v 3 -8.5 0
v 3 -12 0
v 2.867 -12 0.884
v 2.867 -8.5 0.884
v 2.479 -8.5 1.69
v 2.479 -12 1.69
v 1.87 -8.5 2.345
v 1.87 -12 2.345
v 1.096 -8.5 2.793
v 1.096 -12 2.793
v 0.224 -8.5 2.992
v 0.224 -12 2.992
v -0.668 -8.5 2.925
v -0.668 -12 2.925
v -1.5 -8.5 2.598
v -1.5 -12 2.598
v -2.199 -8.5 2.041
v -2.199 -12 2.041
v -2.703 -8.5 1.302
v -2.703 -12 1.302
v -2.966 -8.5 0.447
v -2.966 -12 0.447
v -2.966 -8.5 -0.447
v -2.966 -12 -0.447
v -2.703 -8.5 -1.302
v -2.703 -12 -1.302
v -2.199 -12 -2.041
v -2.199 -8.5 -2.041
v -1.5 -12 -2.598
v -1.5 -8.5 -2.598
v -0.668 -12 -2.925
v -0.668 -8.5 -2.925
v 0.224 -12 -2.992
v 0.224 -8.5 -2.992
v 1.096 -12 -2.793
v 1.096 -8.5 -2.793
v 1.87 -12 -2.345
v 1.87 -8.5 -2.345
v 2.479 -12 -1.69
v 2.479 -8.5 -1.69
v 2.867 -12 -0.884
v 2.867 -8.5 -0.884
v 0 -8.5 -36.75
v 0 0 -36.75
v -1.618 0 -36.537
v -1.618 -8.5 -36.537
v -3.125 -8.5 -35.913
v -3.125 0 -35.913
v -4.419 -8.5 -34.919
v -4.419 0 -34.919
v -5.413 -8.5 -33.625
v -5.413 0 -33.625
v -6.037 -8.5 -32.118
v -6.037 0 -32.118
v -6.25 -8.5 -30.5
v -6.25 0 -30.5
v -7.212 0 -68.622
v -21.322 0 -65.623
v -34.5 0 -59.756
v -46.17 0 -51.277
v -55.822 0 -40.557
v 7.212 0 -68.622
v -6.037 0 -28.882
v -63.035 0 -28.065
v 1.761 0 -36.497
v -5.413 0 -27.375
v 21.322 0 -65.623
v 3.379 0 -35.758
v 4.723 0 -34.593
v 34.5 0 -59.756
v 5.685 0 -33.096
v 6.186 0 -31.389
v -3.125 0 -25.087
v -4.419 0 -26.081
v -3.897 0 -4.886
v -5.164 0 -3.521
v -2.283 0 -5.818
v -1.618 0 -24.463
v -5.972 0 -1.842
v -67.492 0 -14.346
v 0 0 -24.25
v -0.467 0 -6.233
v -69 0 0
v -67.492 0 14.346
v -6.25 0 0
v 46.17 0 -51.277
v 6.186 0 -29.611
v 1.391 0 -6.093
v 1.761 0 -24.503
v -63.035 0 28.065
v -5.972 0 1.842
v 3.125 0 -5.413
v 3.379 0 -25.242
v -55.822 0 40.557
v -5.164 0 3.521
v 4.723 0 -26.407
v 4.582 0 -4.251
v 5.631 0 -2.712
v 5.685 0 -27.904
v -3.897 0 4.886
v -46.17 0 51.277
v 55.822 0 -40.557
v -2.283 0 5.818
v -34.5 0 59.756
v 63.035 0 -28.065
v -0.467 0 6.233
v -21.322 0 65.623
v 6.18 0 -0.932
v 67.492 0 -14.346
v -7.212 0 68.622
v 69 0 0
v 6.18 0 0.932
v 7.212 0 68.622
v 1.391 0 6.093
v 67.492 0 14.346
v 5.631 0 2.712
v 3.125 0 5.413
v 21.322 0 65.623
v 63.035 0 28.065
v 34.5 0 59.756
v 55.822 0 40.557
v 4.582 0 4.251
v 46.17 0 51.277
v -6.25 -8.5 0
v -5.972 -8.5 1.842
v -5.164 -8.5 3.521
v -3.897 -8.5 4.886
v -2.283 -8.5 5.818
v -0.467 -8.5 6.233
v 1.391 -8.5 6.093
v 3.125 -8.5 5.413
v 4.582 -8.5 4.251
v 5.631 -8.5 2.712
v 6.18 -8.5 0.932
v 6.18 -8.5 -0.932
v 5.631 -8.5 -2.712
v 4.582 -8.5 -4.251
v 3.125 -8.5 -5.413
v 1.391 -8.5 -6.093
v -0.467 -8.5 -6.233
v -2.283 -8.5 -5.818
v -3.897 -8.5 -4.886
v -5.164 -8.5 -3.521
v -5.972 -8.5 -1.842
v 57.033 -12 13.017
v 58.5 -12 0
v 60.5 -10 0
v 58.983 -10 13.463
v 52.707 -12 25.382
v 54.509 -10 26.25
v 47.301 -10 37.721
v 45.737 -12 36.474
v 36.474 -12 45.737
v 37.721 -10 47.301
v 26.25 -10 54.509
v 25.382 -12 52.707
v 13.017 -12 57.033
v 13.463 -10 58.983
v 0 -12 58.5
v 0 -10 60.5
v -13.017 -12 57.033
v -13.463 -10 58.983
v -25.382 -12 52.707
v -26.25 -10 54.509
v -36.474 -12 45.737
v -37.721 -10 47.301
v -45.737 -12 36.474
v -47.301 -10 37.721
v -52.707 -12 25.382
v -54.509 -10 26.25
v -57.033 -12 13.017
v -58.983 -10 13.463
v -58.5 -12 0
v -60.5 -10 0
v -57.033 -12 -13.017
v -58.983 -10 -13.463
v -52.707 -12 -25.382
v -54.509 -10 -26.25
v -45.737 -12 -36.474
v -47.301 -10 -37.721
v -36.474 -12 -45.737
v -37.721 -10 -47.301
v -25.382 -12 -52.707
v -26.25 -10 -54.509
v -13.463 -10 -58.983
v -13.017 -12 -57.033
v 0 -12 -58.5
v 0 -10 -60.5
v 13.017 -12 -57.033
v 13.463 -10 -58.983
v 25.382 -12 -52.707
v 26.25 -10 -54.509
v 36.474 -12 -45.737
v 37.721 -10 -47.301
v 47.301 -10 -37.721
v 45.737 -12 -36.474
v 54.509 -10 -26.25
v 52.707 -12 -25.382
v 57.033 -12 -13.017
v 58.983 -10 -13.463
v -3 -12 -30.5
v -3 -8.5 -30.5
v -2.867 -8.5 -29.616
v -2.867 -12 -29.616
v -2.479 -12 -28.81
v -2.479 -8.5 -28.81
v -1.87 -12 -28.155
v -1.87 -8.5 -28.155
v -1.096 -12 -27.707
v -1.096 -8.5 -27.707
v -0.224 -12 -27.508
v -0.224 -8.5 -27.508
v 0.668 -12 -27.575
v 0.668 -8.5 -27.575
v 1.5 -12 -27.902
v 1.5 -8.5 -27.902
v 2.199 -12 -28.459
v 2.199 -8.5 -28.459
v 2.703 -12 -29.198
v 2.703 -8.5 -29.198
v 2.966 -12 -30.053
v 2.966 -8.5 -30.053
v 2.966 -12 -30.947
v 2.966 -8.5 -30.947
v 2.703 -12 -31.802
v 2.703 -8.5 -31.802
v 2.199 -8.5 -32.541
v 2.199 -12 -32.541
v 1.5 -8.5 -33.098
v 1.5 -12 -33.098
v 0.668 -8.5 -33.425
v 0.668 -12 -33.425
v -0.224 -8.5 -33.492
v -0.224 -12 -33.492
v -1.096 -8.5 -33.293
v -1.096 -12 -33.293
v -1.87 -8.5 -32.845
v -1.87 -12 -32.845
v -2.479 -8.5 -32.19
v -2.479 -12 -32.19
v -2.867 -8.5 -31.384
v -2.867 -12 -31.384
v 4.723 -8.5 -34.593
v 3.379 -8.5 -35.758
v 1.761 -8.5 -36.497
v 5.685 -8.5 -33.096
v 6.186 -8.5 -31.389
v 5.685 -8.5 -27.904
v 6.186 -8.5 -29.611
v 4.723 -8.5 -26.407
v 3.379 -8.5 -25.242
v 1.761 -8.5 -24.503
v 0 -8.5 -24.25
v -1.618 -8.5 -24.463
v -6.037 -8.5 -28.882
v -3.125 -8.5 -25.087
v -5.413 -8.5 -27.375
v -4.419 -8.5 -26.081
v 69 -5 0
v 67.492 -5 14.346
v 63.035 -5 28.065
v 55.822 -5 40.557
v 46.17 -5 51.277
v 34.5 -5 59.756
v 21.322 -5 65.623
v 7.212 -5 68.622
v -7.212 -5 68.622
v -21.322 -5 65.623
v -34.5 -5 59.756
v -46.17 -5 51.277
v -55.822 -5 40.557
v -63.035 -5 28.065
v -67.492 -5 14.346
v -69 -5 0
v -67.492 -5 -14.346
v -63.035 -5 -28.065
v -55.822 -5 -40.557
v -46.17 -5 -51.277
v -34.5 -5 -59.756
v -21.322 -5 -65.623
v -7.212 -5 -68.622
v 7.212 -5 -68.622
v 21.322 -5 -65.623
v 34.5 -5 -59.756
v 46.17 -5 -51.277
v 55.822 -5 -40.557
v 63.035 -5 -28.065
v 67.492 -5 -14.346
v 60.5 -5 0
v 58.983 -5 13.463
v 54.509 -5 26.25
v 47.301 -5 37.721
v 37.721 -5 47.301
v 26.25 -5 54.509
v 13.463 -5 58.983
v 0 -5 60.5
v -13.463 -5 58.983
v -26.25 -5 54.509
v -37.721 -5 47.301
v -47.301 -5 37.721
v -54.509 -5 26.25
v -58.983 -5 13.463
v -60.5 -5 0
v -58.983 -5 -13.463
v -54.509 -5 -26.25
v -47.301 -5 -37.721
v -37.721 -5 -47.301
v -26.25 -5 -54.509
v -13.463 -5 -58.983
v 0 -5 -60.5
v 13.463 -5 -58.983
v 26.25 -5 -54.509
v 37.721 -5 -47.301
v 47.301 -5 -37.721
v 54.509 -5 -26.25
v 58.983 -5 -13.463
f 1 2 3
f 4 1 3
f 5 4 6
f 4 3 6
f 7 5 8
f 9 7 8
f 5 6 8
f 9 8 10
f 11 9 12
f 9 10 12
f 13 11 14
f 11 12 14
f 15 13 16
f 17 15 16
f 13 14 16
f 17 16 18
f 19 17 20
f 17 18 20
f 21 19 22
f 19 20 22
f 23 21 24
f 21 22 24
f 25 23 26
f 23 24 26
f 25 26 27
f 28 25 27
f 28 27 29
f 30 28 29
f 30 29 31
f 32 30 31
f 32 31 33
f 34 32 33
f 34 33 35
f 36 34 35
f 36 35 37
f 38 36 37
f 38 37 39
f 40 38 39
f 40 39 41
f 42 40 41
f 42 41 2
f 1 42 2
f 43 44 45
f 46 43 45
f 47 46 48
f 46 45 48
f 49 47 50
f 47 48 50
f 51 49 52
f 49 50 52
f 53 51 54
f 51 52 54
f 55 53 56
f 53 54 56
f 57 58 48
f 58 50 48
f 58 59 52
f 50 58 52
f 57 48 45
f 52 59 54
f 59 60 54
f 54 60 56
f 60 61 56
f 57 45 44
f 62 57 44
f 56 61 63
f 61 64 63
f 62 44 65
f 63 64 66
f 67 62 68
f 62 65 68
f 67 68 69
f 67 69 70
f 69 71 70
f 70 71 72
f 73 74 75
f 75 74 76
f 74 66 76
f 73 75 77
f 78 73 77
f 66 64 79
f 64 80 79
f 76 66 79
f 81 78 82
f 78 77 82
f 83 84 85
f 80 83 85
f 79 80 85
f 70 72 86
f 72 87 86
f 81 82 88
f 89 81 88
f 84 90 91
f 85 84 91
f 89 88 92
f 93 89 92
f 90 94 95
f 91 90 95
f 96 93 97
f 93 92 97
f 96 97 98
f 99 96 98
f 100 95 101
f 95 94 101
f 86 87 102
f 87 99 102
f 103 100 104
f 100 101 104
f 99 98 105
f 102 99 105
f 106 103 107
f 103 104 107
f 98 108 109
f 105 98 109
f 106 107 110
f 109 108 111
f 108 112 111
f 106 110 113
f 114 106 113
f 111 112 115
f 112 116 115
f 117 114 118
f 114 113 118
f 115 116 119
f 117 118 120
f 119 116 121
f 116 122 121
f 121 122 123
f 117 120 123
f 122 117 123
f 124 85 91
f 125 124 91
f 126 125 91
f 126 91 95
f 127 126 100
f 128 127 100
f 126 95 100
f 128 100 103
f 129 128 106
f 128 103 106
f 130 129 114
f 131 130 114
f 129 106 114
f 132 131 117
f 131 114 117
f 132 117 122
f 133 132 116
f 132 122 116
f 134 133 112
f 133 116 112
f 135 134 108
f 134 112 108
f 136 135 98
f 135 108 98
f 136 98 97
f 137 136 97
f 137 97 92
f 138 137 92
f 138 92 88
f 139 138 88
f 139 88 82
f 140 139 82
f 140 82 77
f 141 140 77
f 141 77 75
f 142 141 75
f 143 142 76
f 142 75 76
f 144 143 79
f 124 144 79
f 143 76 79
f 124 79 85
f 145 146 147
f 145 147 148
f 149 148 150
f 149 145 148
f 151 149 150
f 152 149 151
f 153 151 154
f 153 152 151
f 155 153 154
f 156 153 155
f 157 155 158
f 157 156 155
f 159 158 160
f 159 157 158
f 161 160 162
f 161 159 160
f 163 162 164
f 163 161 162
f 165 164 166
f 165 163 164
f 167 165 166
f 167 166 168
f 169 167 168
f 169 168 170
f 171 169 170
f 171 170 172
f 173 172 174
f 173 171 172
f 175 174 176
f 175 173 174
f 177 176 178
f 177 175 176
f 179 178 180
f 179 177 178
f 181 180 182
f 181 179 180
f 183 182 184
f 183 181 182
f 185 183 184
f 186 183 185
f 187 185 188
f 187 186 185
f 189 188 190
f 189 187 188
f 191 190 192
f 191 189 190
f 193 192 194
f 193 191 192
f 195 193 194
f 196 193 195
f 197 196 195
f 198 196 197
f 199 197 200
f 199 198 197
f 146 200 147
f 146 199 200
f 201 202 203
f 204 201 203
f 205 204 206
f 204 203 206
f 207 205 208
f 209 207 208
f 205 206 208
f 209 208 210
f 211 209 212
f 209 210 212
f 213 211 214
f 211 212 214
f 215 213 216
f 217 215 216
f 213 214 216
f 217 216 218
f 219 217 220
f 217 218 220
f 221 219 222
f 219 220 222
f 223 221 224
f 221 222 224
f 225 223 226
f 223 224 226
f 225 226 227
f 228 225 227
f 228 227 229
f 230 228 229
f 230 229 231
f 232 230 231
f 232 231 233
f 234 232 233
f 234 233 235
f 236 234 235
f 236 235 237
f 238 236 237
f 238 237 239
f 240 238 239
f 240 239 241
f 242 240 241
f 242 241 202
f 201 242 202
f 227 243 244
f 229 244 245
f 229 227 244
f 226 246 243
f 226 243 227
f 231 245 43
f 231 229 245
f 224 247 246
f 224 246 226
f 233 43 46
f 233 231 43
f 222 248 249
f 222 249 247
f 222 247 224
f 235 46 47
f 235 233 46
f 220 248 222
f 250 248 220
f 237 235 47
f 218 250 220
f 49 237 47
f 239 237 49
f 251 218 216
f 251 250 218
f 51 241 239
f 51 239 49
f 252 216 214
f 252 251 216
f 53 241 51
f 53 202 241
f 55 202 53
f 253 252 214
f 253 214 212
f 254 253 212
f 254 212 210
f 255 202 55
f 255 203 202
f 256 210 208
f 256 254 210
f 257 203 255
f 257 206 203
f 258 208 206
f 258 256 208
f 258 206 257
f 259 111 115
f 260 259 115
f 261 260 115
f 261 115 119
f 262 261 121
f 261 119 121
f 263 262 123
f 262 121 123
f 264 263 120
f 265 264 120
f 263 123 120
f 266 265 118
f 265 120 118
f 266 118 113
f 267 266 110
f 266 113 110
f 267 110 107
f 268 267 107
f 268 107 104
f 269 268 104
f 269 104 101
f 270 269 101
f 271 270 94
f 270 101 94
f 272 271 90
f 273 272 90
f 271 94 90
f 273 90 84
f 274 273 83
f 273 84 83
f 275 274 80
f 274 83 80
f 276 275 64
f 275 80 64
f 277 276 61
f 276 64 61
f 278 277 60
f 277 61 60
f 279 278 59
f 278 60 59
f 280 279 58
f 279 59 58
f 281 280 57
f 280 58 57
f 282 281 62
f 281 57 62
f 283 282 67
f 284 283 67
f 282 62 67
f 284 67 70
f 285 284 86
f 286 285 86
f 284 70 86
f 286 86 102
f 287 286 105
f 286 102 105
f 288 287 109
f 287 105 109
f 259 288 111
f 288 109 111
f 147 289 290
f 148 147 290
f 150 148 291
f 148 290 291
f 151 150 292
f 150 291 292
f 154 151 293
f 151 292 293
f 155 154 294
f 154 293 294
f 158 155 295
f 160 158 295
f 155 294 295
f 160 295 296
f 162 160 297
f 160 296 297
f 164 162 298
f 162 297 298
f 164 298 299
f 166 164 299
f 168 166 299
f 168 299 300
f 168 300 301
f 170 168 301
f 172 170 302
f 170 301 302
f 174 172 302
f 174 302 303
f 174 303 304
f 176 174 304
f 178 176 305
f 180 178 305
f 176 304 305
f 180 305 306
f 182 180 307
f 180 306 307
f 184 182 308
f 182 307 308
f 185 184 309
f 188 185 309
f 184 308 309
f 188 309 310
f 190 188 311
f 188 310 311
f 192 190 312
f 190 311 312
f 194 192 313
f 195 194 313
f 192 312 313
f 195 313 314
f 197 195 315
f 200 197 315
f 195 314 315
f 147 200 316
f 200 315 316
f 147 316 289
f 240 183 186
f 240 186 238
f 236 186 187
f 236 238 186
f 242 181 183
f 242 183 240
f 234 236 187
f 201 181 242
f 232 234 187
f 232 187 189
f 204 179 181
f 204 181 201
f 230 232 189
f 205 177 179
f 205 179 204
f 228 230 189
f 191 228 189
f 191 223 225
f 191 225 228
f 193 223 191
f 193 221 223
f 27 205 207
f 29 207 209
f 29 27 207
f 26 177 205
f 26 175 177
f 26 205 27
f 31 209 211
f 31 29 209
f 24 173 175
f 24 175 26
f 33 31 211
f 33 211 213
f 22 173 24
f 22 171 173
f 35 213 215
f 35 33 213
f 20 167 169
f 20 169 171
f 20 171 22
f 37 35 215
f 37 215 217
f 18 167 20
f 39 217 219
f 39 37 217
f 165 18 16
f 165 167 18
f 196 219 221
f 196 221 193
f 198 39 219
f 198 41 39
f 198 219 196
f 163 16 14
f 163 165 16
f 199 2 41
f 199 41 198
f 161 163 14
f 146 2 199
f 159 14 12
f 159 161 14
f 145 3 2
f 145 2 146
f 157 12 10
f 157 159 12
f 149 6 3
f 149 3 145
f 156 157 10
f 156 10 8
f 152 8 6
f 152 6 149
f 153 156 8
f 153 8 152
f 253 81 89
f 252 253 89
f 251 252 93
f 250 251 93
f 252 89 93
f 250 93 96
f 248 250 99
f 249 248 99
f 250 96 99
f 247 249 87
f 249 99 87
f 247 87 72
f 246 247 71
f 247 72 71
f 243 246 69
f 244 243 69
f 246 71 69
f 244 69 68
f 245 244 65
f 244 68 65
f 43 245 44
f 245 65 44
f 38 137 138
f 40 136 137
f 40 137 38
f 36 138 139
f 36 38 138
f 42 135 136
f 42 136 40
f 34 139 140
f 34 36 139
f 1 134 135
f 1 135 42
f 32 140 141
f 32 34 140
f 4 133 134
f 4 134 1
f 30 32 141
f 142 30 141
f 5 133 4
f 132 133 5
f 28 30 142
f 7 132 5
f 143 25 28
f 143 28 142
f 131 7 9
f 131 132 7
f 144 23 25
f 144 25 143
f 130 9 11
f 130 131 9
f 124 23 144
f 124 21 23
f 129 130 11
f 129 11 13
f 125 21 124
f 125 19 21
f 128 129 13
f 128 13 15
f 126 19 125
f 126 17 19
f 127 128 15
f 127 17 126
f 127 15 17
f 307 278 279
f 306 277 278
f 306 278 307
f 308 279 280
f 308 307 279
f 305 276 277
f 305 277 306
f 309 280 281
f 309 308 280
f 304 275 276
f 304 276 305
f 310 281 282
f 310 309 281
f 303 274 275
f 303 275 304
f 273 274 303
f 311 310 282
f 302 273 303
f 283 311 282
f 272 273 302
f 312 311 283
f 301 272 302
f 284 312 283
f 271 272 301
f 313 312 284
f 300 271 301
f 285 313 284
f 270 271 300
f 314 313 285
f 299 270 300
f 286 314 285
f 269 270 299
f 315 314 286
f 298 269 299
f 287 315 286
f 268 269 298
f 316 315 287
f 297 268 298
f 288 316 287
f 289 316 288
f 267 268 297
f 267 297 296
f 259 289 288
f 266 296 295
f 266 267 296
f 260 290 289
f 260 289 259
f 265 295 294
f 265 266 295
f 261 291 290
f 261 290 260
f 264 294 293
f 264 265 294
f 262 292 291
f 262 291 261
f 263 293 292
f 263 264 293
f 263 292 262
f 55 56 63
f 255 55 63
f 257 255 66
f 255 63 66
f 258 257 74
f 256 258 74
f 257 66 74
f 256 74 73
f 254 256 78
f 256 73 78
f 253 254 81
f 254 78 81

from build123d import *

# Parameters (mm, degrees)
F0_R      = 69
F1_DEPTH  = 5
F2_R      = 60.5
F3_DEPTH  = 7
F4_R      = 6.25
F5_DEPTH  = 8.5
F6_R      = 3
F7_DEPTH  = 25
F9_DEPTH  = 8.5
F10_R     = 3
F11_DEPTH = 25
F12_SIZE  = 2


with BuildPart() as f1:
    # F0 (on Front) → F1 (new body)
    with BuildSketch(Plane.XZ):
        Circle(F0_R)
    extrude(amount=F1_DEPTH)

    # F2 (on face) → F3 (join)
    with BuildSketch(Plane.XZ.offset(5)):
        Circle(F2_R)
    extrude(amount=F3_DEPTH)

    # F4 (on face) → F5 (cut)
    with BuildSketch(Plane(origin=(0, 0, 0), x_dir=(-1, 0, 0), z_dir=(0, 1, 0))):
        Circle(F4_R)
    extrude(amount=-F5_DEPTH, mode=Mode.SUBTRACT)

    # F6 (on face) → F7 (cut)
    with BuildSketch(Plane.XZ.offset(12)):
        Circle(F6_R)
    extrude(amount=-F7_DEPTH, mode=Mode.SUBTRACT)

    # F8 (on face) → F9 (cut)
    with BuildSketch(Plane(origin=(0, 0, 0), x_dir=(-1, 0, 0), z_dir=(0, 1, 0))):
        with BuildLine():
            ThreePointArc((6.25, -30.5), (4.419417, -26.080583), (0, -24.25))
            Line((0, -24.25), (0, -36.75))
            ThreePointArc((0, -36.75), (4.419417, -34.919417), (6.25, -30.5))
        make_face()
        with BuildLine():
            Line((0, -36.75), (0, -24.25))
            ThreePointArc((0, -24.25), (-6.25, -30.5), (0, -36.75))
        make_face()
    extrude(amount=-F9_DEPTH, mode=Mode.SUBTRACT)

    # F10 (on face) → F11 (cut)
    with BuildSketch(Plane(origin=(0, -8.5, 0), x_dir=(-1, 0, 0), z_dir=(0, 1, 0))):
        with Locations((0, -30.5)):
            Circle(F10_R)
    extrude(amount=-F11_DEPTH, mode=Mode.SUBTRACT)

    # F12
    f12_edges = [f1.edges().sort_by_distance(p)[0] for p in [
        (-60.5, -12, 0),
    ]]
    chamfer(f12_edges, length=F12_SIZE)


solid = f1.part
